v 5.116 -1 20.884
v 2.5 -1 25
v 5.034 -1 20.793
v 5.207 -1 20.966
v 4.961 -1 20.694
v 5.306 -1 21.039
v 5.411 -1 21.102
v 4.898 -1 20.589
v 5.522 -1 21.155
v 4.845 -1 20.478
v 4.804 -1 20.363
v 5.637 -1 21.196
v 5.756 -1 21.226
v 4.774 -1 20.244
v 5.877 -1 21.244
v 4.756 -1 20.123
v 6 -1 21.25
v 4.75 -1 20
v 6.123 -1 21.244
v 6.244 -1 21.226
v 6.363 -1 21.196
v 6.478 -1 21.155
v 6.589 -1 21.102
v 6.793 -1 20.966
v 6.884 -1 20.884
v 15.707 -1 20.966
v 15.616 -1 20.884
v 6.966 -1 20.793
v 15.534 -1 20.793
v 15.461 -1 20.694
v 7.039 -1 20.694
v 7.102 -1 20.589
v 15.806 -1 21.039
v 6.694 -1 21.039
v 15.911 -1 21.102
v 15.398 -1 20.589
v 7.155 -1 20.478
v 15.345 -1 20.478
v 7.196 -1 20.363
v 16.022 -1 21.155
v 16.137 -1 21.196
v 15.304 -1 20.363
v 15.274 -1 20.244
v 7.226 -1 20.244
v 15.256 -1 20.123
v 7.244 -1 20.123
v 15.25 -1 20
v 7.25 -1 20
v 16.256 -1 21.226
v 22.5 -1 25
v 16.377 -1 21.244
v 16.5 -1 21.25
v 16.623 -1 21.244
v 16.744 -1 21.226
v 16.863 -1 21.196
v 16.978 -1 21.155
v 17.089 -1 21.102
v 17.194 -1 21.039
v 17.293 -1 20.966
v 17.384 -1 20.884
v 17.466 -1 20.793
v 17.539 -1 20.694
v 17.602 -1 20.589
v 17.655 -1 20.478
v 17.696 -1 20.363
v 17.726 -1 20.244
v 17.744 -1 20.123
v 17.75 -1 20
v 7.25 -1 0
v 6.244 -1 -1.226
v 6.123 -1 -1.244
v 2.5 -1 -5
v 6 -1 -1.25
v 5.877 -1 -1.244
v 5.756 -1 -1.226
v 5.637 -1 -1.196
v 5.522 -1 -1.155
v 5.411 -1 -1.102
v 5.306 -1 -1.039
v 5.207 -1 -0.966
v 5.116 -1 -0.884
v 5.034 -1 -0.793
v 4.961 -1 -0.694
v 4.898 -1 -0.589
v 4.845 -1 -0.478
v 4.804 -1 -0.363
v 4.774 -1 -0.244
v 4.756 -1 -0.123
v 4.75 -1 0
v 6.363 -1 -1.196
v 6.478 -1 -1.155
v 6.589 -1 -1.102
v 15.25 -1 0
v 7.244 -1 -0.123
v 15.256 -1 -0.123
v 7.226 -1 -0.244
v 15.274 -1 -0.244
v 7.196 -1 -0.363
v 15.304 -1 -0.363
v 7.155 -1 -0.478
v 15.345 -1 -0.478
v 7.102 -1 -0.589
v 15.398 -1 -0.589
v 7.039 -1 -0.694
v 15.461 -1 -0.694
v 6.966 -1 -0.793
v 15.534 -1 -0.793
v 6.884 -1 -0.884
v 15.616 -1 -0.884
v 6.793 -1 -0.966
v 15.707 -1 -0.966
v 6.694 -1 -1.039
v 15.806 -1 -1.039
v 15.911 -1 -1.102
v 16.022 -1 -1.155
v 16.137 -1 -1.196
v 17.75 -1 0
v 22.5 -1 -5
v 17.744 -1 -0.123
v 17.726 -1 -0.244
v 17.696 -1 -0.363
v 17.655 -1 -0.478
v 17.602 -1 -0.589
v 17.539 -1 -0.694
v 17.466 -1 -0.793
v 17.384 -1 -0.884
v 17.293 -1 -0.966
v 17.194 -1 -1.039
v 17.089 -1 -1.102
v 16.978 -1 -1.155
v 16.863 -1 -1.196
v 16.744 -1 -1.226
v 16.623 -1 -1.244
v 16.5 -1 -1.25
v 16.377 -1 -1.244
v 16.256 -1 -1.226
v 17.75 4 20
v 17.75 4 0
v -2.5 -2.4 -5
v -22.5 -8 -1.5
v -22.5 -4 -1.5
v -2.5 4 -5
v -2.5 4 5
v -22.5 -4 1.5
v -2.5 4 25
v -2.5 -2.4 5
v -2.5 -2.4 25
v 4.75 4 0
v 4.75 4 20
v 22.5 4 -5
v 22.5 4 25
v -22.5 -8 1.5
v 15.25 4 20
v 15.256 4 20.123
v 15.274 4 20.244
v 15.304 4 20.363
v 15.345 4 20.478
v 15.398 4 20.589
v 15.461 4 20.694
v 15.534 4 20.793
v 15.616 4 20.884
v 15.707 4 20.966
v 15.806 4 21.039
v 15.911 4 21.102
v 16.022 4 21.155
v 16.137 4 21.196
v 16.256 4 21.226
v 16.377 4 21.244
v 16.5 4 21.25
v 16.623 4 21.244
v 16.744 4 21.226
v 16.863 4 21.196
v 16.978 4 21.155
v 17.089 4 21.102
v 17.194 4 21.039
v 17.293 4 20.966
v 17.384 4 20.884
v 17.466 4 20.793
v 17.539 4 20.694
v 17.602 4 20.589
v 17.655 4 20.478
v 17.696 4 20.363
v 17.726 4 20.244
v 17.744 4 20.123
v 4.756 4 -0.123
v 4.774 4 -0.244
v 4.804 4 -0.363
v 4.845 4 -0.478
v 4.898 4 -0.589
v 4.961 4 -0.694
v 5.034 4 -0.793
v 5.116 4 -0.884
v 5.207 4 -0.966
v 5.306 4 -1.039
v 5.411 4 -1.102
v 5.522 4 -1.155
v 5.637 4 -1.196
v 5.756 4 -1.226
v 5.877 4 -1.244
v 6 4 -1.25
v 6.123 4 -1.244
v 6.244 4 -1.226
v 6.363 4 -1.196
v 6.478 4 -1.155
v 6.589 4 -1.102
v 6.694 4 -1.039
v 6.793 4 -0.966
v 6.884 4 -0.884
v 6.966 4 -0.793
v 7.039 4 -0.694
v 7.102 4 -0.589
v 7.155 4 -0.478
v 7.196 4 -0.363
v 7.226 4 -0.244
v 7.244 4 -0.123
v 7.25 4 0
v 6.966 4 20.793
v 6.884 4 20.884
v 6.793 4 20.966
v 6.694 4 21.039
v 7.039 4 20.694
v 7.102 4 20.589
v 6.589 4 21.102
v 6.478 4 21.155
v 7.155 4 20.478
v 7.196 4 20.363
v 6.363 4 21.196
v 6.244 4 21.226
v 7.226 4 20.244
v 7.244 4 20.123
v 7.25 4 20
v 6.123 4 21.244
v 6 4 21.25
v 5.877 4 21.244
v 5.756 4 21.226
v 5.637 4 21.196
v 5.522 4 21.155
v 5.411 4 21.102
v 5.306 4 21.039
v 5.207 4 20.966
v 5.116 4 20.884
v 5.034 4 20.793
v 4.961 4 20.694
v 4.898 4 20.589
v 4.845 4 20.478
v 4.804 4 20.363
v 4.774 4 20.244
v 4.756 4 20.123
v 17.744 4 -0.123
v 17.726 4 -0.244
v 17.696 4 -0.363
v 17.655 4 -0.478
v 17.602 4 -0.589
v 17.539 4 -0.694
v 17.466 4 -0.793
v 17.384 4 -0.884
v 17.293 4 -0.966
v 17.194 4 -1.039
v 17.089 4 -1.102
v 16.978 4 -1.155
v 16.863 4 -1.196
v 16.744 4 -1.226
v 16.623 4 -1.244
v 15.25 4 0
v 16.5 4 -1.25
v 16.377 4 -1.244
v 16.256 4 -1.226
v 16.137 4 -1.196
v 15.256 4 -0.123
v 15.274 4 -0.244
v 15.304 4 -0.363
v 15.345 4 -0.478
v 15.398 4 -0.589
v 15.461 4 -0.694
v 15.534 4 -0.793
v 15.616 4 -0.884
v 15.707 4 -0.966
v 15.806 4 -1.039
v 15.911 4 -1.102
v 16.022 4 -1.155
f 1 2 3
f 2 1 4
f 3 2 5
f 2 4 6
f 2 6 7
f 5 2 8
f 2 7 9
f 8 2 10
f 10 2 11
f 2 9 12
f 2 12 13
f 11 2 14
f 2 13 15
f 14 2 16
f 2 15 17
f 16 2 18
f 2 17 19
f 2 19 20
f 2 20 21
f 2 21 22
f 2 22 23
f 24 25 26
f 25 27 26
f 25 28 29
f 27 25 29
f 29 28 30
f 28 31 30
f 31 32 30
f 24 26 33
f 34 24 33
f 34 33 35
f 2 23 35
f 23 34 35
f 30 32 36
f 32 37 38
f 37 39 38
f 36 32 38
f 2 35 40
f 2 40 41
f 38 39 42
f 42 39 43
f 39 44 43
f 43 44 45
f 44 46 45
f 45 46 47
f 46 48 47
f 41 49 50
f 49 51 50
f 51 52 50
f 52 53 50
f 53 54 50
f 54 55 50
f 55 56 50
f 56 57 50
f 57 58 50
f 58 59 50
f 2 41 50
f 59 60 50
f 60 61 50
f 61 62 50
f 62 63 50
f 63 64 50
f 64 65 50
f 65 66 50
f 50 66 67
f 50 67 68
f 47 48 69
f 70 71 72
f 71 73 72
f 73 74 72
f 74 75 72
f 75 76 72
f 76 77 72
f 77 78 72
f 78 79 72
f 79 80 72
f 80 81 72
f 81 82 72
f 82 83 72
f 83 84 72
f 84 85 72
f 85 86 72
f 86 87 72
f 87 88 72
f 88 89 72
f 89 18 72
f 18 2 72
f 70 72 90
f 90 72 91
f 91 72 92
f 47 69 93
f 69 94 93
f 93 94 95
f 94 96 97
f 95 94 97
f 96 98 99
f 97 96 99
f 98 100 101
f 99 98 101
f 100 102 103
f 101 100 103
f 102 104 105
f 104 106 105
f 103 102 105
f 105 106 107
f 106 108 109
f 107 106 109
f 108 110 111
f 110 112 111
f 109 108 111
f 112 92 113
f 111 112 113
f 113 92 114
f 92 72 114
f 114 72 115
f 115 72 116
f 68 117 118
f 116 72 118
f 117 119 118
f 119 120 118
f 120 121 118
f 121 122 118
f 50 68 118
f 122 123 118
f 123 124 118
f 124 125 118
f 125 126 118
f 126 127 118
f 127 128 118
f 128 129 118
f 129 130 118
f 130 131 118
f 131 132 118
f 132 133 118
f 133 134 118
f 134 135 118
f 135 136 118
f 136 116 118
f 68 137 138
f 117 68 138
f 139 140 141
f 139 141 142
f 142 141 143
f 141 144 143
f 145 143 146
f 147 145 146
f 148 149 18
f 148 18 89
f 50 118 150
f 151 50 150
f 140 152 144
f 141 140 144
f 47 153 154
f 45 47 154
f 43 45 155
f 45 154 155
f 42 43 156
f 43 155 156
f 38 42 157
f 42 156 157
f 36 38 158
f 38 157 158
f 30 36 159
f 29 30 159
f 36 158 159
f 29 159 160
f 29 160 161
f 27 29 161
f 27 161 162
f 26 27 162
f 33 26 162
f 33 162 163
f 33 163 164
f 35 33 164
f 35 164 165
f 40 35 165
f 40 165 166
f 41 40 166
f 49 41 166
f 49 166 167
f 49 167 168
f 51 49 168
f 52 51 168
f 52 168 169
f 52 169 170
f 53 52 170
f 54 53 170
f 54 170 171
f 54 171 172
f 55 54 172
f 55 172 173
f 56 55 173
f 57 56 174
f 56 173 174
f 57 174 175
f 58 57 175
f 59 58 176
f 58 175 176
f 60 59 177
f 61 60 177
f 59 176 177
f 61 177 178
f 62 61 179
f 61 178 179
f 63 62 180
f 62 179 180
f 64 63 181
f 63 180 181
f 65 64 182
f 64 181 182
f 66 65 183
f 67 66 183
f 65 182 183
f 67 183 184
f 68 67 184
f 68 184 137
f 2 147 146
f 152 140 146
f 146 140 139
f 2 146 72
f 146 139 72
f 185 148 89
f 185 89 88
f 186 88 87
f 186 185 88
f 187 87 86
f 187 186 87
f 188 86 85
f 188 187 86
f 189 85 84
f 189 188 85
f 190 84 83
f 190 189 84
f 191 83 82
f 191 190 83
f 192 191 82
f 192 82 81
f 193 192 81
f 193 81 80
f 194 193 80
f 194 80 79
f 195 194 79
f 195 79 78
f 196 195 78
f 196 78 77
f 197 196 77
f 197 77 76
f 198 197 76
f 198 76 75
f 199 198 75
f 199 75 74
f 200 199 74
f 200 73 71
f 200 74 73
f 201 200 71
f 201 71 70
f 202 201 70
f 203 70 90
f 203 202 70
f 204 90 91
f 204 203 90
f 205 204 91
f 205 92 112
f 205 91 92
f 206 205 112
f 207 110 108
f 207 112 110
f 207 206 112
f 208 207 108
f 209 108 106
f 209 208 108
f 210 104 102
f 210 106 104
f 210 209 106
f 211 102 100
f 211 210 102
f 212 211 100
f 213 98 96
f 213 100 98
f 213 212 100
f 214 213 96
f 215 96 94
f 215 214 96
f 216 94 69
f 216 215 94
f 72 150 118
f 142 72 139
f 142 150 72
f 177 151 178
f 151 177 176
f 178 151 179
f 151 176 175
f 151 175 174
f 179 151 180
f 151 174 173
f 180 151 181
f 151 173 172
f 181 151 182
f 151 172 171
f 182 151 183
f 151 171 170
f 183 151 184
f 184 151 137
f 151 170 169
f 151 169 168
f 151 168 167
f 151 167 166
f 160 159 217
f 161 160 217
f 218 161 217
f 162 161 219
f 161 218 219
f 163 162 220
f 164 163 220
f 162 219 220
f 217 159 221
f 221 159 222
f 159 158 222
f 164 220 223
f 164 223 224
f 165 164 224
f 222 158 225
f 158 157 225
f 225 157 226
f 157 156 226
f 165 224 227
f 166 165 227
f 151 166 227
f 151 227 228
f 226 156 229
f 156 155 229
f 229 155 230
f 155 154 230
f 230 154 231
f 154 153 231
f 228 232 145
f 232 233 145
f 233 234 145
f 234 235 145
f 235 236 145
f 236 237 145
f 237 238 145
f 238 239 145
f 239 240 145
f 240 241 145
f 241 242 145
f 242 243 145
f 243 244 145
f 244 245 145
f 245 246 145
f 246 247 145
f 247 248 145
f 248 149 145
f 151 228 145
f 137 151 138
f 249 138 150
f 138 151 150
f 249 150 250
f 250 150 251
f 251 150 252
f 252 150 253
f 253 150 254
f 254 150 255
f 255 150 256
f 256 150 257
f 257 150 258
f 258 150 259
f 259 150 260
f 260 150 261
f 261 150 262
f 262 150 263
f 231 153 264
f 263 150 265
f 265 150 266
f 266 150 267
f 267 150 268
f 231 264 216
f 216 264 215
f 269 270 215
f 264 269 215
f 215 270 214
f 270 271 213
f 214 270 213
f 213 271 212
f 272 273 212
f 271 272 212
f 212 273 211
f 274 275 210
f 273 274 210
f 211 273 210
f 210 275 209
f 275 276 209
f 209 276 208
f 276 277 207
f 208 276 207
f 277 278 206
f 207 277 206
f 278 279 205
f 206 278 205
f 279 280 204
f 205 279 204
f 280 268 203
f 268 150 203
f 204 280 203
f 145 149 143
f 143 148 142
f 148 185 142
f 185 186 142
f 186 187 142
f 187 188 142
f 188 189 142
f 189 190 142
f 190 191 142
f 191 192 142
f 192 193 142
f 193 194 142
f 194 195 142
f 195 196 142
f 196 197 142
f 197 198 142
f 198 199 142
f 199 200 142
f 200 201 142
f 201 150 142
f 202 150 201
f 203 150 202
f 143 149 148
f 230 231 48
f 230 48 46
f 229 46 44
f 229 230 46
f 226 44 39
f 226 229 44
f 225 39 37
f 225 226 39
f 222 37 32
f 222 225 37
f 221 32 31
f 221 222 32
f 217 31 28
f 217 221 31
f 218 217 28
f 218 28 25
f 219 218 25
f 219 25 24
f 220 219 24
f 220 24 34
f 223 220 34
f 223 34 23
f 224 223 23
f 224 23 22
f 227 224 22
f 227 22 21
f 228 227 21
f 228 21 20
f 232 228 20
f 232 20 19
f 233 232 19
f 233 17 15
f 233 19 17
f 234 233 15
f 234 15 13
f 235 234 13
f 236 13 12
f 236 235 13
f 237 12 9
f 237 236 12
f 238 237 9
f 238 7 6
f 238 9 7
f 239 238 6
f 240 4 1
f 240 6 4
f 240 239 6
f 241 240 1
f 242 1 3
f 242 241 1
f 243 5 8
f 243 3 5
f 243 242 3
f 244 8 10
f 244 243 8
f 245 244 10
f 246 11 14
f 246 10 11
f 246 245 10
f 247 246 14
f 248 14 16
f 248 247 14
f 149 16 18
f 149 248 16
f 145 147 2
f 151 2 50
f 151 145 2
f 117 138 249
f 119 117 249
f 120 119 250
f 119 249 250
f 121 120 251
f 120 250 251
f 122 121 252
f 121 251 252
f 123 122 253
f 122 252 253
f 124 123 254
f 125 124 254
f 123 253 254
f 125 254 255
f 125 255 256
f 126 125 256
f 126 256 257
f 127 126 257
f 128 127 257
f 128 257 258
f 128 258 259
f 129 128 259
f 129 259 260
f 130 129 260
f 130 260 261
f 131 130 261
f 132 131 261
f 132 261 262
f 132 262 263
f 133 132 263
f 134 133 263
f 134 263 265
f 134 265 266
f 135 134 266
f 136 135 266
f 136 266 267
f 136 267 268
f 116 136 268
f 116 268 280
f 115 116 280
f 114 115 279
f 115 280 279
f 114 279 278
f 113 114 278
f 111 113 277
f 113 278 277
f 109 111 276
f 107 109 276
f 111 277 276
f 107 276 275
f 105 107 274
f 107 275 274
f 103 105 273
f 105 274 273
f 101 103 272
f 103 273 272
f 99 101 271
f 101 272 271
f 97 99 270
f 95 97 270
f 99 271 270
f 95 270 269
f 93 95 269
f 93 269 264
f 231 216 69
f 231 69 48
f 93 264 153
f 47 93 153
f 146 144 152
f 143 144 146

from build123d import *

# Parameters (mm, degrees)
SALIENTE_EXTRUIR1_DEPTH = 5
CORTAR_EXTRUIR1_DEPTH   = 15
SALIENTE_EXTRUIR2_DEPTH = 20
CORTAR_EXTRUIR2_DEPTH   = 30


with BuildPart() as part:
    # Croquis1 → Saliente-Extruir1 (new, symmetric)
    with BuildSketch(Plane.XY):
        Polygon((-2.5, 4), (2.5, -1), (-22.5, -8), (-22.5, -4), align=None)
        Polygon((22.5, 4), (-2.5, 4), (2.5, -1), (22.5, -1), align=None)
    extrude(amount=SALIENTE_EXTRUIR1_DEPTH, both=True)

    # Croquis3 → Cortar-Extruir1 (cut, symmetric)
    with BuildSketch(Plane(origin=(0, 0, 0), x_dir=(1, 0, 0), z_dir=(0, 1, 0))):
        Polygon((-22.5, 1.5), (-2.5, 5), (-22.5, 5), align=None)
        Polygon((-2.5, -5), (-22.5, -5), (-22.5, -1.5), align=None)
    extrude(amount=CORTAR_EXTRUIR1_DEPTH, both=True, mode=Mode.SUBTRACT)

    # Croquis5 → Saliente-Extruir2 (add)
    with BuildSketch(Plane.XY.offset(5)):
        Polygon((-2.5, 4), (-2.5, -2.4), (2.5, -1), (22.5, -1), (22.5, 4), align=None)
    extrude(amount=SALIENTE_EXTRUIR2_DEPTH)

    # Croquis2 → Cortar-Extruir2 (cut)
    with BuildSketch(Plane(origin=(0, 4, 0), x_dir=(1, 0, 0), z_dir=(0, 1, 0))):
        with BuildLine():
            Line((7.25, 0), (7.25, -20))
            ThreePointArc((7.25, -20), (6, -21.25), (4.75, -20))
            Line((4.75, -20), (4.75, 0))
            ThreePointArc((4.75, 0), (6, 1.25), (7.25, 0))
        make_face()
        with BuildLine():
            Line((15.25, 0), (15.25, -20))
            ThreePointArc((15.25, -20), (16.5, -21.25), (17.75, -20))
            Line((17.75, -20), (17.75, 0))
            ThreePointArc((17.75, 0), (16.5, 1.25), (15.25, 0))
        make_face()
    extrude(amount=-CORTAR_EXTRUIR2_DEPTH, mode=Mode.SUBTRACT)


solid = part.part
